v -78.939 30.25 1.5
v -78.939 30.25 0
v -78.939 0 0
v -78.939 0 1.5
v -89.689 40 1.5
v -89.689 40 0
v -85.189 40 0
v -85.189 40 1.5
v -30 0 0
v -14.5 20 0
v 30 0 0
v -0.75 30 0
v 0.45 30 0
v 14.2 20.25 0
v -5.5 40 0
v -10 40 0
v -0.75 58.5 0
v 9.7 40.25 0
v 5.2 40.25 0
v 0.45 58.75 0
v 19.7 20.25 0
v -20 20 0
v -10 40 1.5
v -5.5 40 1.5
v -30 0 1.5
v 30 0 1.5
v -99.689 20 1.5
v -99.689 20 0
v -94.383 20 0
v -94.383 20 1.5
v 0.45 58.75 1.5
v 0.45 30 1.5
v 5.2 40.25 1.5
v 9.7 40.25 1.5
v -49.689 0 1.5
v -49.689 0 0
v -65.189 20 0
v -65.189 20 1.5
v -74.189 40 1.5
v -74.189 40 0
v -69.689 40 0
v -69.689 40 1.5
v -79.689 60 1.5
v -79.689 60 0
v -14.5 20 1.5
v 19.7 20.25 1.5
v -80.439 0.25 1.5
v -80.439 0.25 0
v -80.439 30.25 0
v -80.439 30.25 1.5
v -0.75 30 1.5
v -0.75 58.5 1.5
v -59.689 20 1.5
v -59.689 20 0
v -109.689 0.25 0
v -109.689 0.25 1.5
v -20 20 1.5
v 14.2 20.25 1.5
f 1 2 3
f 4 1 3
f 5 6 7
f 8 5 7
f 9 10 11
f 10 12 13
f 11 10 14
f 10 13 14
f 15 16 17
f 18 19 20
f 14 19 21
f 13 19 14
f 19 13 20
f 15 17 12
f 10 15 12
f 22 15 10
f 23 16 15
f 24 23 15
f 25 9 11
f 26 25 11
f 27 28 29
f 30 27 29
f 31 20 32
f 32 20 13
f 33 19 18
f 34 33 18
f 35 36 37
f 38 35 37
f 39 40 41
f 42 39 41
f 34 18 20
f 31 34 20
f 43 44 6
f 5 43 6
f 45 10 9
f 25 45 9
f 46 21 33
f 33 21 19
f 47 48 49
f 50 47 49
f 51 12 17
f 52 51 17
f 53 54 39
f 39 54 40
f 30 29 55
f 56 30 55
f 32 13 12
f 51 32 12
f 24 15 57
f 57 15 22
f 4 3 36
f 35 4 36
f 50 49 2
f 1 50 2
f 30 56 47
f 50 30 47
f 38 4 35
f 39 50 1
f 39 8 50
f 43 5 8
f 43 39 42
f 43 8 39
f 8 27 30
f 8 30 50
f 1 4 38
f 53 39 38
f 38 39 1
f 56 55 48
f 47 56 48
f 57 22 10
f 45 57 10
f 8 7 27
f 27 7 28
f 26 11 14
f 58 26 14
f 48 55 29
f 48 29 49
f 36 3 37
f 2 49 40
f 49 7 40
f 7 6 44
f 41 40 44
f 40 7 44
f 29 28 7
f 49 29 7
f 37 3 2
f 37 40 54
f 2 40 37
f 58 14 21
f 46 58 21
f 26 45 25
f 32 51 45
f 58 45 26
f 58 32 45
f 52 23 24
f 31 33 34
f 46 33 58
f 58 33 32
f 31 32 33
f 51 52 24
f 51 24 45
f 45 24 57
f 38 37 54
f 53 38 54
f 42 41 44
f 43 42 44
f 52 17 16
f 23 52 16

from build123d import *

# Parameters (mm, degrees)
F1_DEPTH = 1.5


with BuildPart() as f1:
    # F0 (on Top) → F1 (new body)
    with BuildSketch(Plane.XY):
        Polygon((-69.688795, 40), (-79.688795, 60), (-89.688795, 40), (-85.188795, 40), (-99.688795, 20), (-94.382545, 20), (-109.688795, 0.25), (-80.438795, 0.25), (-80.438795, 30.25), (-78.938795, 30.25), (-78.938795, 0), (-49.688795, 0), (-65.188795, 20), (-59.688795, 20), (-74.188795, 40), align=None)
        Polygon((-30, 0), (0, 0), (30, 0), (14.2, 20.25), (19.7, 20.25), (5.2, 40.25), (9.7, 40.25), (0.45, 58.75), (0.45, 30), (-0.75, 30), (-0.75, 58.5), (-10, 40), (-5.5, 40), (-20, 20), (-14.5, 20), align=None)
    extrude(amount=F1_DEPTH)


solid = f1.part
